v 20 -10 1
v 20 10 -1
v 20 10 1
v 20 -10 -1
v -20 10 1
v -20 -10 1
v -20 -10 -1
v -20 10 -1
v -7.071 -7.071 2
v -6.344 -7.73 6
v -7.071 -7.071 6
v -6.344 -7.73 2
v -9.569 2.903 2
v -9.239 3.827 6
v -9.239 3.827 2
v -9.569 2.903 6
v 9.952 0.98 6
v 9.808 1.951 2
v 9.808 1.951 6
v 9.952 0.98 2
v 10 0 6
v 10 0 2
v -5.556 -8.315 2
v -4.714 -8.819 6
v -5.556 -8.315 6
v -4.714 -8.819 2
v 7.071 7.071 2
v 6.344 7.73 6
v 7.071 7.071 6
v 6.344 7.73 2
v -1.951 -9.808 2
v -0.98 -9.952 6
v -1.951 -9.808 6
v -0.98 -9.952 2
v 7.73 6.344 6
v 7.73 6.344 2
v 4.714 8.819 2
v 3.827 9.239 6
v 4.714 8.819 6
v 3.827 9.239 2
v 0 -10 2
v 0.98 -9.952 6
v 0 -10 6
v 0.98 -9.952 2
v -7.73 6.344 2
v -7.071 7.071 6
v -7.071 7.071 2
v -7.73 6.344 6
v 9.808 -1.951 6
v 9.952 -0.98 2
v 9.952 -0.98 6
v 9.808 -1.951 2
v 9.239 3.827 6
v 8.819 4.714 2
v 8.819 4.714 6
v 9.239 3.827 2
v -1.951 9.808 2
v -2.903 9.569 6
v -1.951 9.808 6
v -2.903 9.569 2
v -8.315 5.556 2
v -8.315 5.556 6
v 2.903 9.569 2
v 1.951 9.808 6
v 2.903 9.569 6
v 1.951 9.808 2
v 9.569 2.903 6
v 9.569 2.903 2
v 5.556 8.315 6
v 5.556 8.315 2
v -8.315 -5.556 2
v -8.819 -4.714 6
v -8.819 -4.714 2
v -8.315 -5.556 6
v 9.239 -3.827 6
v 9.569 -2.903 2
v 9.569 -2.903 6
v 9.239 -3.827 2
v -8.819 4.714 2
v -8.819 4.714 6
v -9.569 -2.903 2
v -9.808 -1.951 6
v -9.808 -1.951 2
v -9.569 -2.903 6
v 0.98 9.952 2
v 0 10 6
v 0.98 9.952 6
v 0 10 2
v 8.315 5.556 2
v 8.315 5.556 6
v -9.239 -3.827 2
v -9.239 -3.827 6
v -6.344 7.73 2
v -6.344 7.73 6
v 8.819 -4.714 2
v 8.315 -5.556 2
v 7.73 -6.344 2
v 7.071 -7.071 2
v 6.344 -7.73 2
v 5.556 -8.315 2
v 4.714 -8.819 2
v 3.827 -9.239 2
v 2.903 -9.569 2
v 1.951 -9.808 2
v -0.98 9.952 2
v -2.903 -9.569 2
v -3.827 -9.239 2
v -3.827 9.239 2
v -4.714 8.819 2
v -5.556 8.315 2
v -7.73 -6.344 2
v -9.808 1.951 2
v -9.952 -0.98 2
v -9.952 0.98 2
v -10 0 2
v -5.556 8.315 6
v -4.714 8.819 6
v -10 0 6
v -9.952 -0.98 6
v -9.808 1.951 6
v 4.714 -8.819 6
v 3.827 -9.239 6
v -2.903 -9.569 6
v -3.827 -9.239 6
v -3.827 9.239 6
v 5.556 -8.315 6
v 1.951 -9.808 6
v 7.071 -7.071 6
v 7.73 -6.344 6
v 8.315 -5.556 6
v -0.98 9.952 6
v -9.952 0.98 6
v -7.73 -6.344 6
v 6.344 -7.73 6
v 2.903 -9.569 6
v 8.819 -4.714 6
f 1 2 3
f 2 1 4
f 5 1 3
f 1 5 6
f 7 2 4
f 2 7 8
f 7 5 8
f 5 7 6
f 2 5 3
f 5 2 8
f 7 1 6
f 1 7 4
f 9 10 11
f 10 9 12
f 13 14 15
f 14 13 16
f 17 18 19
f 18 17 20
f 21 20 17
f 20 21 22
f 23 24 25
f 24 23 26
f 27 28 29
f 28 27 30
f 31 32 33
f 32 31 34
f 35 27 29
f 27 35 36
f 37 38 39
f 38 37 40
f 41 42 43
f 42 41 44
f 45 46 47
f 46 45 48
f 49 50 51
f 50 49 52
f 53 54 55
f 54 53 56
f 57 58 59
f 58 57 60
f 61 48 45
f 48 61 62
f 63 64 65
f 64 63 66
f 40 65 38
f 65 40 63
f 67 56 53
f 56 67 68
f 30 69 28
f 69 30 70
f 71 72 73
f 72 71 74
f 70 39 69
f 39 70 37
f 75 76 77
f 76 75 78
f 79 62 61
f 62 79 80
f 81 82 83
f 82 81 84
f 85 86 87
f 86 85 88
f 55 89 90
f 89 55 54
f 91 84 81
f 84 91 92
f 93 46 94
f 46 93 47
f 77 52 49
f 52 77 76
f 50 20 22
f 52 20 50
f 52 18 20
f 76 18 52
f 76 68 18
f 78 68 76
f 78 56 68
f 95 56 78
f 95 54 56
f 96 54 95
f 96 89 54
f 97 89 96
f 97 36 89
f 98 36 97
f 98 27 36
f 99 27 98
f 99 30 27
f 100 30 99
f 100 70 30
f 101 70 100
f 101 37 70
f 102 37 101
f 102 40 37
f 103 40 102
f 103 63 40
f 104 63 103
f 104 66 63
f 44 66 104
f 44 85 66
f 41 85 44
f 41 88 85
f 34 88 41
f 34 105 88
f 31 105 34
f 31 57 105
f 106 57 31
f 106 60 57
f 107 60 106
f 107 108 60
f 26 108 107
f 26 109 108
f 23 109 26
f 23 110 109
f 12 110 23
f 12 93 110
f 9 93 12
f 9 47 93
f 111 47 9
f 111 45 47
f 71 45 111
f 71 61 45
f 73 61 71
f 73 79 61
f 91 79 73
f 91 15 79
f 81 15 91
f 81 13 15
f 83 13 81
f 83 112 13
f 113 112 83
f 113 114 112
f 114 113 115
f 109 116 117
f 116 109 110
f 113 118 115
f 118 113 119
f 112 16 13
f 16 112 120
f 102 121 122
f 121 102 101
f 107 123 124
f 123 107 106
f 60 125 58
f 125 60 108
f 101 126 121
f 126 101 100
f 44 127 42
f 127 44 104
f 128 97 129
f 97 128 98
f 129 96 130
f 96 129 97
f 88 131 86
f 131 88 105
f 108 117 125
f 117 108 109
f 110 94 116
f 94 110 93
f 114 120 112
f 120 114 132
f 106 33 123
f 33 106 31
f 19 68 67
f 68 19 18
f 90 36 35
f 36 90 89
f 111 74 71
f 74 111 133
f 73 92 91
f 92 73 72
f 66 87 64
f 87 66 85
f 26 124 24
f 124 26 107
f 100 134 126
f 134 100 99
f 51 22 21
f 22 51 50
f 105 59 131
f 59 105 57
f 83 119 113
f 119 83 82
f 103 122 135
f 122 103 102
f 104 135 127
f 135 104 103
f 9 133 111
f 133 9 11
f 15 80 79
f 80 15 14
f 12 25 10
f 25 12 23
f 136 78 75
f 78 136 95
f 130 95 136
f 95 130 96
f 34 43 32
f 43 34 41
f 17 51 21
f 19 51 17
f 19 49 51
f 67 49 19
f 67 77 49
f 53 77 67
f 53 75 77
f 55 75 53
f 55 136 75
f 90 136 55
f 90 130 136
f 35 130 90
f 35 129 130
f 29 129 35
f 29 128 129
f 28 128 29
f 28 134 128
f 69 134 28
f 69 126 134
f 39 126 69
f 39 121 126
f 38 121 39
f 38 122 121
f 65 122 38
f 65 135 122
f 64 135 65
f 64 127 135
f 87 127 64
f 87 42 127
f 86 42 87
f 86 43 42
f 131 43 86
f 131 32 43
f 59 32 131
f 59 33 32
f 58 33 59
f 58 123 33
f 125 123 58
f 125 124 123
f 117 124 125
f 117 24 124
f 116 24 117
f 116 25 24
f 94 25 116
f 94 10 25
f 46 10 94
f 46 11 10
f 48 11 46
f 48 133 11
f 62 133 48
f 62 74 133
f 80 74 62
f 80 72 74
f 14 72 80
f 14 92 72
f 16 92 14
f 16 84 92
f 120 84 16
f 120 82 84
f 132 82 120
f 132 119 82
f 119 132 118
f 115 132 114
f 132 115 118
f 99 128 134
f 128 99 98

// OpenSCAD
// PMM color parameter pattern.
// Provenance: official release v0.9.0.
// Evidence: forum.bambulab.com/t/paramatric-model-maker-v0-9-0-support-multi-color-modeling/100160

accent_hex = "#FF6600"; // color
base_hex = "#E6E6E6"; // color
size_mm = 20;

color(base_hex)
cube([size_mm * 2, size_mm, 2], center = true);

translate([0, 0, 2])
color(accent_hex)
cylinder(h = 4, d = size_mm, $fn = 64);
